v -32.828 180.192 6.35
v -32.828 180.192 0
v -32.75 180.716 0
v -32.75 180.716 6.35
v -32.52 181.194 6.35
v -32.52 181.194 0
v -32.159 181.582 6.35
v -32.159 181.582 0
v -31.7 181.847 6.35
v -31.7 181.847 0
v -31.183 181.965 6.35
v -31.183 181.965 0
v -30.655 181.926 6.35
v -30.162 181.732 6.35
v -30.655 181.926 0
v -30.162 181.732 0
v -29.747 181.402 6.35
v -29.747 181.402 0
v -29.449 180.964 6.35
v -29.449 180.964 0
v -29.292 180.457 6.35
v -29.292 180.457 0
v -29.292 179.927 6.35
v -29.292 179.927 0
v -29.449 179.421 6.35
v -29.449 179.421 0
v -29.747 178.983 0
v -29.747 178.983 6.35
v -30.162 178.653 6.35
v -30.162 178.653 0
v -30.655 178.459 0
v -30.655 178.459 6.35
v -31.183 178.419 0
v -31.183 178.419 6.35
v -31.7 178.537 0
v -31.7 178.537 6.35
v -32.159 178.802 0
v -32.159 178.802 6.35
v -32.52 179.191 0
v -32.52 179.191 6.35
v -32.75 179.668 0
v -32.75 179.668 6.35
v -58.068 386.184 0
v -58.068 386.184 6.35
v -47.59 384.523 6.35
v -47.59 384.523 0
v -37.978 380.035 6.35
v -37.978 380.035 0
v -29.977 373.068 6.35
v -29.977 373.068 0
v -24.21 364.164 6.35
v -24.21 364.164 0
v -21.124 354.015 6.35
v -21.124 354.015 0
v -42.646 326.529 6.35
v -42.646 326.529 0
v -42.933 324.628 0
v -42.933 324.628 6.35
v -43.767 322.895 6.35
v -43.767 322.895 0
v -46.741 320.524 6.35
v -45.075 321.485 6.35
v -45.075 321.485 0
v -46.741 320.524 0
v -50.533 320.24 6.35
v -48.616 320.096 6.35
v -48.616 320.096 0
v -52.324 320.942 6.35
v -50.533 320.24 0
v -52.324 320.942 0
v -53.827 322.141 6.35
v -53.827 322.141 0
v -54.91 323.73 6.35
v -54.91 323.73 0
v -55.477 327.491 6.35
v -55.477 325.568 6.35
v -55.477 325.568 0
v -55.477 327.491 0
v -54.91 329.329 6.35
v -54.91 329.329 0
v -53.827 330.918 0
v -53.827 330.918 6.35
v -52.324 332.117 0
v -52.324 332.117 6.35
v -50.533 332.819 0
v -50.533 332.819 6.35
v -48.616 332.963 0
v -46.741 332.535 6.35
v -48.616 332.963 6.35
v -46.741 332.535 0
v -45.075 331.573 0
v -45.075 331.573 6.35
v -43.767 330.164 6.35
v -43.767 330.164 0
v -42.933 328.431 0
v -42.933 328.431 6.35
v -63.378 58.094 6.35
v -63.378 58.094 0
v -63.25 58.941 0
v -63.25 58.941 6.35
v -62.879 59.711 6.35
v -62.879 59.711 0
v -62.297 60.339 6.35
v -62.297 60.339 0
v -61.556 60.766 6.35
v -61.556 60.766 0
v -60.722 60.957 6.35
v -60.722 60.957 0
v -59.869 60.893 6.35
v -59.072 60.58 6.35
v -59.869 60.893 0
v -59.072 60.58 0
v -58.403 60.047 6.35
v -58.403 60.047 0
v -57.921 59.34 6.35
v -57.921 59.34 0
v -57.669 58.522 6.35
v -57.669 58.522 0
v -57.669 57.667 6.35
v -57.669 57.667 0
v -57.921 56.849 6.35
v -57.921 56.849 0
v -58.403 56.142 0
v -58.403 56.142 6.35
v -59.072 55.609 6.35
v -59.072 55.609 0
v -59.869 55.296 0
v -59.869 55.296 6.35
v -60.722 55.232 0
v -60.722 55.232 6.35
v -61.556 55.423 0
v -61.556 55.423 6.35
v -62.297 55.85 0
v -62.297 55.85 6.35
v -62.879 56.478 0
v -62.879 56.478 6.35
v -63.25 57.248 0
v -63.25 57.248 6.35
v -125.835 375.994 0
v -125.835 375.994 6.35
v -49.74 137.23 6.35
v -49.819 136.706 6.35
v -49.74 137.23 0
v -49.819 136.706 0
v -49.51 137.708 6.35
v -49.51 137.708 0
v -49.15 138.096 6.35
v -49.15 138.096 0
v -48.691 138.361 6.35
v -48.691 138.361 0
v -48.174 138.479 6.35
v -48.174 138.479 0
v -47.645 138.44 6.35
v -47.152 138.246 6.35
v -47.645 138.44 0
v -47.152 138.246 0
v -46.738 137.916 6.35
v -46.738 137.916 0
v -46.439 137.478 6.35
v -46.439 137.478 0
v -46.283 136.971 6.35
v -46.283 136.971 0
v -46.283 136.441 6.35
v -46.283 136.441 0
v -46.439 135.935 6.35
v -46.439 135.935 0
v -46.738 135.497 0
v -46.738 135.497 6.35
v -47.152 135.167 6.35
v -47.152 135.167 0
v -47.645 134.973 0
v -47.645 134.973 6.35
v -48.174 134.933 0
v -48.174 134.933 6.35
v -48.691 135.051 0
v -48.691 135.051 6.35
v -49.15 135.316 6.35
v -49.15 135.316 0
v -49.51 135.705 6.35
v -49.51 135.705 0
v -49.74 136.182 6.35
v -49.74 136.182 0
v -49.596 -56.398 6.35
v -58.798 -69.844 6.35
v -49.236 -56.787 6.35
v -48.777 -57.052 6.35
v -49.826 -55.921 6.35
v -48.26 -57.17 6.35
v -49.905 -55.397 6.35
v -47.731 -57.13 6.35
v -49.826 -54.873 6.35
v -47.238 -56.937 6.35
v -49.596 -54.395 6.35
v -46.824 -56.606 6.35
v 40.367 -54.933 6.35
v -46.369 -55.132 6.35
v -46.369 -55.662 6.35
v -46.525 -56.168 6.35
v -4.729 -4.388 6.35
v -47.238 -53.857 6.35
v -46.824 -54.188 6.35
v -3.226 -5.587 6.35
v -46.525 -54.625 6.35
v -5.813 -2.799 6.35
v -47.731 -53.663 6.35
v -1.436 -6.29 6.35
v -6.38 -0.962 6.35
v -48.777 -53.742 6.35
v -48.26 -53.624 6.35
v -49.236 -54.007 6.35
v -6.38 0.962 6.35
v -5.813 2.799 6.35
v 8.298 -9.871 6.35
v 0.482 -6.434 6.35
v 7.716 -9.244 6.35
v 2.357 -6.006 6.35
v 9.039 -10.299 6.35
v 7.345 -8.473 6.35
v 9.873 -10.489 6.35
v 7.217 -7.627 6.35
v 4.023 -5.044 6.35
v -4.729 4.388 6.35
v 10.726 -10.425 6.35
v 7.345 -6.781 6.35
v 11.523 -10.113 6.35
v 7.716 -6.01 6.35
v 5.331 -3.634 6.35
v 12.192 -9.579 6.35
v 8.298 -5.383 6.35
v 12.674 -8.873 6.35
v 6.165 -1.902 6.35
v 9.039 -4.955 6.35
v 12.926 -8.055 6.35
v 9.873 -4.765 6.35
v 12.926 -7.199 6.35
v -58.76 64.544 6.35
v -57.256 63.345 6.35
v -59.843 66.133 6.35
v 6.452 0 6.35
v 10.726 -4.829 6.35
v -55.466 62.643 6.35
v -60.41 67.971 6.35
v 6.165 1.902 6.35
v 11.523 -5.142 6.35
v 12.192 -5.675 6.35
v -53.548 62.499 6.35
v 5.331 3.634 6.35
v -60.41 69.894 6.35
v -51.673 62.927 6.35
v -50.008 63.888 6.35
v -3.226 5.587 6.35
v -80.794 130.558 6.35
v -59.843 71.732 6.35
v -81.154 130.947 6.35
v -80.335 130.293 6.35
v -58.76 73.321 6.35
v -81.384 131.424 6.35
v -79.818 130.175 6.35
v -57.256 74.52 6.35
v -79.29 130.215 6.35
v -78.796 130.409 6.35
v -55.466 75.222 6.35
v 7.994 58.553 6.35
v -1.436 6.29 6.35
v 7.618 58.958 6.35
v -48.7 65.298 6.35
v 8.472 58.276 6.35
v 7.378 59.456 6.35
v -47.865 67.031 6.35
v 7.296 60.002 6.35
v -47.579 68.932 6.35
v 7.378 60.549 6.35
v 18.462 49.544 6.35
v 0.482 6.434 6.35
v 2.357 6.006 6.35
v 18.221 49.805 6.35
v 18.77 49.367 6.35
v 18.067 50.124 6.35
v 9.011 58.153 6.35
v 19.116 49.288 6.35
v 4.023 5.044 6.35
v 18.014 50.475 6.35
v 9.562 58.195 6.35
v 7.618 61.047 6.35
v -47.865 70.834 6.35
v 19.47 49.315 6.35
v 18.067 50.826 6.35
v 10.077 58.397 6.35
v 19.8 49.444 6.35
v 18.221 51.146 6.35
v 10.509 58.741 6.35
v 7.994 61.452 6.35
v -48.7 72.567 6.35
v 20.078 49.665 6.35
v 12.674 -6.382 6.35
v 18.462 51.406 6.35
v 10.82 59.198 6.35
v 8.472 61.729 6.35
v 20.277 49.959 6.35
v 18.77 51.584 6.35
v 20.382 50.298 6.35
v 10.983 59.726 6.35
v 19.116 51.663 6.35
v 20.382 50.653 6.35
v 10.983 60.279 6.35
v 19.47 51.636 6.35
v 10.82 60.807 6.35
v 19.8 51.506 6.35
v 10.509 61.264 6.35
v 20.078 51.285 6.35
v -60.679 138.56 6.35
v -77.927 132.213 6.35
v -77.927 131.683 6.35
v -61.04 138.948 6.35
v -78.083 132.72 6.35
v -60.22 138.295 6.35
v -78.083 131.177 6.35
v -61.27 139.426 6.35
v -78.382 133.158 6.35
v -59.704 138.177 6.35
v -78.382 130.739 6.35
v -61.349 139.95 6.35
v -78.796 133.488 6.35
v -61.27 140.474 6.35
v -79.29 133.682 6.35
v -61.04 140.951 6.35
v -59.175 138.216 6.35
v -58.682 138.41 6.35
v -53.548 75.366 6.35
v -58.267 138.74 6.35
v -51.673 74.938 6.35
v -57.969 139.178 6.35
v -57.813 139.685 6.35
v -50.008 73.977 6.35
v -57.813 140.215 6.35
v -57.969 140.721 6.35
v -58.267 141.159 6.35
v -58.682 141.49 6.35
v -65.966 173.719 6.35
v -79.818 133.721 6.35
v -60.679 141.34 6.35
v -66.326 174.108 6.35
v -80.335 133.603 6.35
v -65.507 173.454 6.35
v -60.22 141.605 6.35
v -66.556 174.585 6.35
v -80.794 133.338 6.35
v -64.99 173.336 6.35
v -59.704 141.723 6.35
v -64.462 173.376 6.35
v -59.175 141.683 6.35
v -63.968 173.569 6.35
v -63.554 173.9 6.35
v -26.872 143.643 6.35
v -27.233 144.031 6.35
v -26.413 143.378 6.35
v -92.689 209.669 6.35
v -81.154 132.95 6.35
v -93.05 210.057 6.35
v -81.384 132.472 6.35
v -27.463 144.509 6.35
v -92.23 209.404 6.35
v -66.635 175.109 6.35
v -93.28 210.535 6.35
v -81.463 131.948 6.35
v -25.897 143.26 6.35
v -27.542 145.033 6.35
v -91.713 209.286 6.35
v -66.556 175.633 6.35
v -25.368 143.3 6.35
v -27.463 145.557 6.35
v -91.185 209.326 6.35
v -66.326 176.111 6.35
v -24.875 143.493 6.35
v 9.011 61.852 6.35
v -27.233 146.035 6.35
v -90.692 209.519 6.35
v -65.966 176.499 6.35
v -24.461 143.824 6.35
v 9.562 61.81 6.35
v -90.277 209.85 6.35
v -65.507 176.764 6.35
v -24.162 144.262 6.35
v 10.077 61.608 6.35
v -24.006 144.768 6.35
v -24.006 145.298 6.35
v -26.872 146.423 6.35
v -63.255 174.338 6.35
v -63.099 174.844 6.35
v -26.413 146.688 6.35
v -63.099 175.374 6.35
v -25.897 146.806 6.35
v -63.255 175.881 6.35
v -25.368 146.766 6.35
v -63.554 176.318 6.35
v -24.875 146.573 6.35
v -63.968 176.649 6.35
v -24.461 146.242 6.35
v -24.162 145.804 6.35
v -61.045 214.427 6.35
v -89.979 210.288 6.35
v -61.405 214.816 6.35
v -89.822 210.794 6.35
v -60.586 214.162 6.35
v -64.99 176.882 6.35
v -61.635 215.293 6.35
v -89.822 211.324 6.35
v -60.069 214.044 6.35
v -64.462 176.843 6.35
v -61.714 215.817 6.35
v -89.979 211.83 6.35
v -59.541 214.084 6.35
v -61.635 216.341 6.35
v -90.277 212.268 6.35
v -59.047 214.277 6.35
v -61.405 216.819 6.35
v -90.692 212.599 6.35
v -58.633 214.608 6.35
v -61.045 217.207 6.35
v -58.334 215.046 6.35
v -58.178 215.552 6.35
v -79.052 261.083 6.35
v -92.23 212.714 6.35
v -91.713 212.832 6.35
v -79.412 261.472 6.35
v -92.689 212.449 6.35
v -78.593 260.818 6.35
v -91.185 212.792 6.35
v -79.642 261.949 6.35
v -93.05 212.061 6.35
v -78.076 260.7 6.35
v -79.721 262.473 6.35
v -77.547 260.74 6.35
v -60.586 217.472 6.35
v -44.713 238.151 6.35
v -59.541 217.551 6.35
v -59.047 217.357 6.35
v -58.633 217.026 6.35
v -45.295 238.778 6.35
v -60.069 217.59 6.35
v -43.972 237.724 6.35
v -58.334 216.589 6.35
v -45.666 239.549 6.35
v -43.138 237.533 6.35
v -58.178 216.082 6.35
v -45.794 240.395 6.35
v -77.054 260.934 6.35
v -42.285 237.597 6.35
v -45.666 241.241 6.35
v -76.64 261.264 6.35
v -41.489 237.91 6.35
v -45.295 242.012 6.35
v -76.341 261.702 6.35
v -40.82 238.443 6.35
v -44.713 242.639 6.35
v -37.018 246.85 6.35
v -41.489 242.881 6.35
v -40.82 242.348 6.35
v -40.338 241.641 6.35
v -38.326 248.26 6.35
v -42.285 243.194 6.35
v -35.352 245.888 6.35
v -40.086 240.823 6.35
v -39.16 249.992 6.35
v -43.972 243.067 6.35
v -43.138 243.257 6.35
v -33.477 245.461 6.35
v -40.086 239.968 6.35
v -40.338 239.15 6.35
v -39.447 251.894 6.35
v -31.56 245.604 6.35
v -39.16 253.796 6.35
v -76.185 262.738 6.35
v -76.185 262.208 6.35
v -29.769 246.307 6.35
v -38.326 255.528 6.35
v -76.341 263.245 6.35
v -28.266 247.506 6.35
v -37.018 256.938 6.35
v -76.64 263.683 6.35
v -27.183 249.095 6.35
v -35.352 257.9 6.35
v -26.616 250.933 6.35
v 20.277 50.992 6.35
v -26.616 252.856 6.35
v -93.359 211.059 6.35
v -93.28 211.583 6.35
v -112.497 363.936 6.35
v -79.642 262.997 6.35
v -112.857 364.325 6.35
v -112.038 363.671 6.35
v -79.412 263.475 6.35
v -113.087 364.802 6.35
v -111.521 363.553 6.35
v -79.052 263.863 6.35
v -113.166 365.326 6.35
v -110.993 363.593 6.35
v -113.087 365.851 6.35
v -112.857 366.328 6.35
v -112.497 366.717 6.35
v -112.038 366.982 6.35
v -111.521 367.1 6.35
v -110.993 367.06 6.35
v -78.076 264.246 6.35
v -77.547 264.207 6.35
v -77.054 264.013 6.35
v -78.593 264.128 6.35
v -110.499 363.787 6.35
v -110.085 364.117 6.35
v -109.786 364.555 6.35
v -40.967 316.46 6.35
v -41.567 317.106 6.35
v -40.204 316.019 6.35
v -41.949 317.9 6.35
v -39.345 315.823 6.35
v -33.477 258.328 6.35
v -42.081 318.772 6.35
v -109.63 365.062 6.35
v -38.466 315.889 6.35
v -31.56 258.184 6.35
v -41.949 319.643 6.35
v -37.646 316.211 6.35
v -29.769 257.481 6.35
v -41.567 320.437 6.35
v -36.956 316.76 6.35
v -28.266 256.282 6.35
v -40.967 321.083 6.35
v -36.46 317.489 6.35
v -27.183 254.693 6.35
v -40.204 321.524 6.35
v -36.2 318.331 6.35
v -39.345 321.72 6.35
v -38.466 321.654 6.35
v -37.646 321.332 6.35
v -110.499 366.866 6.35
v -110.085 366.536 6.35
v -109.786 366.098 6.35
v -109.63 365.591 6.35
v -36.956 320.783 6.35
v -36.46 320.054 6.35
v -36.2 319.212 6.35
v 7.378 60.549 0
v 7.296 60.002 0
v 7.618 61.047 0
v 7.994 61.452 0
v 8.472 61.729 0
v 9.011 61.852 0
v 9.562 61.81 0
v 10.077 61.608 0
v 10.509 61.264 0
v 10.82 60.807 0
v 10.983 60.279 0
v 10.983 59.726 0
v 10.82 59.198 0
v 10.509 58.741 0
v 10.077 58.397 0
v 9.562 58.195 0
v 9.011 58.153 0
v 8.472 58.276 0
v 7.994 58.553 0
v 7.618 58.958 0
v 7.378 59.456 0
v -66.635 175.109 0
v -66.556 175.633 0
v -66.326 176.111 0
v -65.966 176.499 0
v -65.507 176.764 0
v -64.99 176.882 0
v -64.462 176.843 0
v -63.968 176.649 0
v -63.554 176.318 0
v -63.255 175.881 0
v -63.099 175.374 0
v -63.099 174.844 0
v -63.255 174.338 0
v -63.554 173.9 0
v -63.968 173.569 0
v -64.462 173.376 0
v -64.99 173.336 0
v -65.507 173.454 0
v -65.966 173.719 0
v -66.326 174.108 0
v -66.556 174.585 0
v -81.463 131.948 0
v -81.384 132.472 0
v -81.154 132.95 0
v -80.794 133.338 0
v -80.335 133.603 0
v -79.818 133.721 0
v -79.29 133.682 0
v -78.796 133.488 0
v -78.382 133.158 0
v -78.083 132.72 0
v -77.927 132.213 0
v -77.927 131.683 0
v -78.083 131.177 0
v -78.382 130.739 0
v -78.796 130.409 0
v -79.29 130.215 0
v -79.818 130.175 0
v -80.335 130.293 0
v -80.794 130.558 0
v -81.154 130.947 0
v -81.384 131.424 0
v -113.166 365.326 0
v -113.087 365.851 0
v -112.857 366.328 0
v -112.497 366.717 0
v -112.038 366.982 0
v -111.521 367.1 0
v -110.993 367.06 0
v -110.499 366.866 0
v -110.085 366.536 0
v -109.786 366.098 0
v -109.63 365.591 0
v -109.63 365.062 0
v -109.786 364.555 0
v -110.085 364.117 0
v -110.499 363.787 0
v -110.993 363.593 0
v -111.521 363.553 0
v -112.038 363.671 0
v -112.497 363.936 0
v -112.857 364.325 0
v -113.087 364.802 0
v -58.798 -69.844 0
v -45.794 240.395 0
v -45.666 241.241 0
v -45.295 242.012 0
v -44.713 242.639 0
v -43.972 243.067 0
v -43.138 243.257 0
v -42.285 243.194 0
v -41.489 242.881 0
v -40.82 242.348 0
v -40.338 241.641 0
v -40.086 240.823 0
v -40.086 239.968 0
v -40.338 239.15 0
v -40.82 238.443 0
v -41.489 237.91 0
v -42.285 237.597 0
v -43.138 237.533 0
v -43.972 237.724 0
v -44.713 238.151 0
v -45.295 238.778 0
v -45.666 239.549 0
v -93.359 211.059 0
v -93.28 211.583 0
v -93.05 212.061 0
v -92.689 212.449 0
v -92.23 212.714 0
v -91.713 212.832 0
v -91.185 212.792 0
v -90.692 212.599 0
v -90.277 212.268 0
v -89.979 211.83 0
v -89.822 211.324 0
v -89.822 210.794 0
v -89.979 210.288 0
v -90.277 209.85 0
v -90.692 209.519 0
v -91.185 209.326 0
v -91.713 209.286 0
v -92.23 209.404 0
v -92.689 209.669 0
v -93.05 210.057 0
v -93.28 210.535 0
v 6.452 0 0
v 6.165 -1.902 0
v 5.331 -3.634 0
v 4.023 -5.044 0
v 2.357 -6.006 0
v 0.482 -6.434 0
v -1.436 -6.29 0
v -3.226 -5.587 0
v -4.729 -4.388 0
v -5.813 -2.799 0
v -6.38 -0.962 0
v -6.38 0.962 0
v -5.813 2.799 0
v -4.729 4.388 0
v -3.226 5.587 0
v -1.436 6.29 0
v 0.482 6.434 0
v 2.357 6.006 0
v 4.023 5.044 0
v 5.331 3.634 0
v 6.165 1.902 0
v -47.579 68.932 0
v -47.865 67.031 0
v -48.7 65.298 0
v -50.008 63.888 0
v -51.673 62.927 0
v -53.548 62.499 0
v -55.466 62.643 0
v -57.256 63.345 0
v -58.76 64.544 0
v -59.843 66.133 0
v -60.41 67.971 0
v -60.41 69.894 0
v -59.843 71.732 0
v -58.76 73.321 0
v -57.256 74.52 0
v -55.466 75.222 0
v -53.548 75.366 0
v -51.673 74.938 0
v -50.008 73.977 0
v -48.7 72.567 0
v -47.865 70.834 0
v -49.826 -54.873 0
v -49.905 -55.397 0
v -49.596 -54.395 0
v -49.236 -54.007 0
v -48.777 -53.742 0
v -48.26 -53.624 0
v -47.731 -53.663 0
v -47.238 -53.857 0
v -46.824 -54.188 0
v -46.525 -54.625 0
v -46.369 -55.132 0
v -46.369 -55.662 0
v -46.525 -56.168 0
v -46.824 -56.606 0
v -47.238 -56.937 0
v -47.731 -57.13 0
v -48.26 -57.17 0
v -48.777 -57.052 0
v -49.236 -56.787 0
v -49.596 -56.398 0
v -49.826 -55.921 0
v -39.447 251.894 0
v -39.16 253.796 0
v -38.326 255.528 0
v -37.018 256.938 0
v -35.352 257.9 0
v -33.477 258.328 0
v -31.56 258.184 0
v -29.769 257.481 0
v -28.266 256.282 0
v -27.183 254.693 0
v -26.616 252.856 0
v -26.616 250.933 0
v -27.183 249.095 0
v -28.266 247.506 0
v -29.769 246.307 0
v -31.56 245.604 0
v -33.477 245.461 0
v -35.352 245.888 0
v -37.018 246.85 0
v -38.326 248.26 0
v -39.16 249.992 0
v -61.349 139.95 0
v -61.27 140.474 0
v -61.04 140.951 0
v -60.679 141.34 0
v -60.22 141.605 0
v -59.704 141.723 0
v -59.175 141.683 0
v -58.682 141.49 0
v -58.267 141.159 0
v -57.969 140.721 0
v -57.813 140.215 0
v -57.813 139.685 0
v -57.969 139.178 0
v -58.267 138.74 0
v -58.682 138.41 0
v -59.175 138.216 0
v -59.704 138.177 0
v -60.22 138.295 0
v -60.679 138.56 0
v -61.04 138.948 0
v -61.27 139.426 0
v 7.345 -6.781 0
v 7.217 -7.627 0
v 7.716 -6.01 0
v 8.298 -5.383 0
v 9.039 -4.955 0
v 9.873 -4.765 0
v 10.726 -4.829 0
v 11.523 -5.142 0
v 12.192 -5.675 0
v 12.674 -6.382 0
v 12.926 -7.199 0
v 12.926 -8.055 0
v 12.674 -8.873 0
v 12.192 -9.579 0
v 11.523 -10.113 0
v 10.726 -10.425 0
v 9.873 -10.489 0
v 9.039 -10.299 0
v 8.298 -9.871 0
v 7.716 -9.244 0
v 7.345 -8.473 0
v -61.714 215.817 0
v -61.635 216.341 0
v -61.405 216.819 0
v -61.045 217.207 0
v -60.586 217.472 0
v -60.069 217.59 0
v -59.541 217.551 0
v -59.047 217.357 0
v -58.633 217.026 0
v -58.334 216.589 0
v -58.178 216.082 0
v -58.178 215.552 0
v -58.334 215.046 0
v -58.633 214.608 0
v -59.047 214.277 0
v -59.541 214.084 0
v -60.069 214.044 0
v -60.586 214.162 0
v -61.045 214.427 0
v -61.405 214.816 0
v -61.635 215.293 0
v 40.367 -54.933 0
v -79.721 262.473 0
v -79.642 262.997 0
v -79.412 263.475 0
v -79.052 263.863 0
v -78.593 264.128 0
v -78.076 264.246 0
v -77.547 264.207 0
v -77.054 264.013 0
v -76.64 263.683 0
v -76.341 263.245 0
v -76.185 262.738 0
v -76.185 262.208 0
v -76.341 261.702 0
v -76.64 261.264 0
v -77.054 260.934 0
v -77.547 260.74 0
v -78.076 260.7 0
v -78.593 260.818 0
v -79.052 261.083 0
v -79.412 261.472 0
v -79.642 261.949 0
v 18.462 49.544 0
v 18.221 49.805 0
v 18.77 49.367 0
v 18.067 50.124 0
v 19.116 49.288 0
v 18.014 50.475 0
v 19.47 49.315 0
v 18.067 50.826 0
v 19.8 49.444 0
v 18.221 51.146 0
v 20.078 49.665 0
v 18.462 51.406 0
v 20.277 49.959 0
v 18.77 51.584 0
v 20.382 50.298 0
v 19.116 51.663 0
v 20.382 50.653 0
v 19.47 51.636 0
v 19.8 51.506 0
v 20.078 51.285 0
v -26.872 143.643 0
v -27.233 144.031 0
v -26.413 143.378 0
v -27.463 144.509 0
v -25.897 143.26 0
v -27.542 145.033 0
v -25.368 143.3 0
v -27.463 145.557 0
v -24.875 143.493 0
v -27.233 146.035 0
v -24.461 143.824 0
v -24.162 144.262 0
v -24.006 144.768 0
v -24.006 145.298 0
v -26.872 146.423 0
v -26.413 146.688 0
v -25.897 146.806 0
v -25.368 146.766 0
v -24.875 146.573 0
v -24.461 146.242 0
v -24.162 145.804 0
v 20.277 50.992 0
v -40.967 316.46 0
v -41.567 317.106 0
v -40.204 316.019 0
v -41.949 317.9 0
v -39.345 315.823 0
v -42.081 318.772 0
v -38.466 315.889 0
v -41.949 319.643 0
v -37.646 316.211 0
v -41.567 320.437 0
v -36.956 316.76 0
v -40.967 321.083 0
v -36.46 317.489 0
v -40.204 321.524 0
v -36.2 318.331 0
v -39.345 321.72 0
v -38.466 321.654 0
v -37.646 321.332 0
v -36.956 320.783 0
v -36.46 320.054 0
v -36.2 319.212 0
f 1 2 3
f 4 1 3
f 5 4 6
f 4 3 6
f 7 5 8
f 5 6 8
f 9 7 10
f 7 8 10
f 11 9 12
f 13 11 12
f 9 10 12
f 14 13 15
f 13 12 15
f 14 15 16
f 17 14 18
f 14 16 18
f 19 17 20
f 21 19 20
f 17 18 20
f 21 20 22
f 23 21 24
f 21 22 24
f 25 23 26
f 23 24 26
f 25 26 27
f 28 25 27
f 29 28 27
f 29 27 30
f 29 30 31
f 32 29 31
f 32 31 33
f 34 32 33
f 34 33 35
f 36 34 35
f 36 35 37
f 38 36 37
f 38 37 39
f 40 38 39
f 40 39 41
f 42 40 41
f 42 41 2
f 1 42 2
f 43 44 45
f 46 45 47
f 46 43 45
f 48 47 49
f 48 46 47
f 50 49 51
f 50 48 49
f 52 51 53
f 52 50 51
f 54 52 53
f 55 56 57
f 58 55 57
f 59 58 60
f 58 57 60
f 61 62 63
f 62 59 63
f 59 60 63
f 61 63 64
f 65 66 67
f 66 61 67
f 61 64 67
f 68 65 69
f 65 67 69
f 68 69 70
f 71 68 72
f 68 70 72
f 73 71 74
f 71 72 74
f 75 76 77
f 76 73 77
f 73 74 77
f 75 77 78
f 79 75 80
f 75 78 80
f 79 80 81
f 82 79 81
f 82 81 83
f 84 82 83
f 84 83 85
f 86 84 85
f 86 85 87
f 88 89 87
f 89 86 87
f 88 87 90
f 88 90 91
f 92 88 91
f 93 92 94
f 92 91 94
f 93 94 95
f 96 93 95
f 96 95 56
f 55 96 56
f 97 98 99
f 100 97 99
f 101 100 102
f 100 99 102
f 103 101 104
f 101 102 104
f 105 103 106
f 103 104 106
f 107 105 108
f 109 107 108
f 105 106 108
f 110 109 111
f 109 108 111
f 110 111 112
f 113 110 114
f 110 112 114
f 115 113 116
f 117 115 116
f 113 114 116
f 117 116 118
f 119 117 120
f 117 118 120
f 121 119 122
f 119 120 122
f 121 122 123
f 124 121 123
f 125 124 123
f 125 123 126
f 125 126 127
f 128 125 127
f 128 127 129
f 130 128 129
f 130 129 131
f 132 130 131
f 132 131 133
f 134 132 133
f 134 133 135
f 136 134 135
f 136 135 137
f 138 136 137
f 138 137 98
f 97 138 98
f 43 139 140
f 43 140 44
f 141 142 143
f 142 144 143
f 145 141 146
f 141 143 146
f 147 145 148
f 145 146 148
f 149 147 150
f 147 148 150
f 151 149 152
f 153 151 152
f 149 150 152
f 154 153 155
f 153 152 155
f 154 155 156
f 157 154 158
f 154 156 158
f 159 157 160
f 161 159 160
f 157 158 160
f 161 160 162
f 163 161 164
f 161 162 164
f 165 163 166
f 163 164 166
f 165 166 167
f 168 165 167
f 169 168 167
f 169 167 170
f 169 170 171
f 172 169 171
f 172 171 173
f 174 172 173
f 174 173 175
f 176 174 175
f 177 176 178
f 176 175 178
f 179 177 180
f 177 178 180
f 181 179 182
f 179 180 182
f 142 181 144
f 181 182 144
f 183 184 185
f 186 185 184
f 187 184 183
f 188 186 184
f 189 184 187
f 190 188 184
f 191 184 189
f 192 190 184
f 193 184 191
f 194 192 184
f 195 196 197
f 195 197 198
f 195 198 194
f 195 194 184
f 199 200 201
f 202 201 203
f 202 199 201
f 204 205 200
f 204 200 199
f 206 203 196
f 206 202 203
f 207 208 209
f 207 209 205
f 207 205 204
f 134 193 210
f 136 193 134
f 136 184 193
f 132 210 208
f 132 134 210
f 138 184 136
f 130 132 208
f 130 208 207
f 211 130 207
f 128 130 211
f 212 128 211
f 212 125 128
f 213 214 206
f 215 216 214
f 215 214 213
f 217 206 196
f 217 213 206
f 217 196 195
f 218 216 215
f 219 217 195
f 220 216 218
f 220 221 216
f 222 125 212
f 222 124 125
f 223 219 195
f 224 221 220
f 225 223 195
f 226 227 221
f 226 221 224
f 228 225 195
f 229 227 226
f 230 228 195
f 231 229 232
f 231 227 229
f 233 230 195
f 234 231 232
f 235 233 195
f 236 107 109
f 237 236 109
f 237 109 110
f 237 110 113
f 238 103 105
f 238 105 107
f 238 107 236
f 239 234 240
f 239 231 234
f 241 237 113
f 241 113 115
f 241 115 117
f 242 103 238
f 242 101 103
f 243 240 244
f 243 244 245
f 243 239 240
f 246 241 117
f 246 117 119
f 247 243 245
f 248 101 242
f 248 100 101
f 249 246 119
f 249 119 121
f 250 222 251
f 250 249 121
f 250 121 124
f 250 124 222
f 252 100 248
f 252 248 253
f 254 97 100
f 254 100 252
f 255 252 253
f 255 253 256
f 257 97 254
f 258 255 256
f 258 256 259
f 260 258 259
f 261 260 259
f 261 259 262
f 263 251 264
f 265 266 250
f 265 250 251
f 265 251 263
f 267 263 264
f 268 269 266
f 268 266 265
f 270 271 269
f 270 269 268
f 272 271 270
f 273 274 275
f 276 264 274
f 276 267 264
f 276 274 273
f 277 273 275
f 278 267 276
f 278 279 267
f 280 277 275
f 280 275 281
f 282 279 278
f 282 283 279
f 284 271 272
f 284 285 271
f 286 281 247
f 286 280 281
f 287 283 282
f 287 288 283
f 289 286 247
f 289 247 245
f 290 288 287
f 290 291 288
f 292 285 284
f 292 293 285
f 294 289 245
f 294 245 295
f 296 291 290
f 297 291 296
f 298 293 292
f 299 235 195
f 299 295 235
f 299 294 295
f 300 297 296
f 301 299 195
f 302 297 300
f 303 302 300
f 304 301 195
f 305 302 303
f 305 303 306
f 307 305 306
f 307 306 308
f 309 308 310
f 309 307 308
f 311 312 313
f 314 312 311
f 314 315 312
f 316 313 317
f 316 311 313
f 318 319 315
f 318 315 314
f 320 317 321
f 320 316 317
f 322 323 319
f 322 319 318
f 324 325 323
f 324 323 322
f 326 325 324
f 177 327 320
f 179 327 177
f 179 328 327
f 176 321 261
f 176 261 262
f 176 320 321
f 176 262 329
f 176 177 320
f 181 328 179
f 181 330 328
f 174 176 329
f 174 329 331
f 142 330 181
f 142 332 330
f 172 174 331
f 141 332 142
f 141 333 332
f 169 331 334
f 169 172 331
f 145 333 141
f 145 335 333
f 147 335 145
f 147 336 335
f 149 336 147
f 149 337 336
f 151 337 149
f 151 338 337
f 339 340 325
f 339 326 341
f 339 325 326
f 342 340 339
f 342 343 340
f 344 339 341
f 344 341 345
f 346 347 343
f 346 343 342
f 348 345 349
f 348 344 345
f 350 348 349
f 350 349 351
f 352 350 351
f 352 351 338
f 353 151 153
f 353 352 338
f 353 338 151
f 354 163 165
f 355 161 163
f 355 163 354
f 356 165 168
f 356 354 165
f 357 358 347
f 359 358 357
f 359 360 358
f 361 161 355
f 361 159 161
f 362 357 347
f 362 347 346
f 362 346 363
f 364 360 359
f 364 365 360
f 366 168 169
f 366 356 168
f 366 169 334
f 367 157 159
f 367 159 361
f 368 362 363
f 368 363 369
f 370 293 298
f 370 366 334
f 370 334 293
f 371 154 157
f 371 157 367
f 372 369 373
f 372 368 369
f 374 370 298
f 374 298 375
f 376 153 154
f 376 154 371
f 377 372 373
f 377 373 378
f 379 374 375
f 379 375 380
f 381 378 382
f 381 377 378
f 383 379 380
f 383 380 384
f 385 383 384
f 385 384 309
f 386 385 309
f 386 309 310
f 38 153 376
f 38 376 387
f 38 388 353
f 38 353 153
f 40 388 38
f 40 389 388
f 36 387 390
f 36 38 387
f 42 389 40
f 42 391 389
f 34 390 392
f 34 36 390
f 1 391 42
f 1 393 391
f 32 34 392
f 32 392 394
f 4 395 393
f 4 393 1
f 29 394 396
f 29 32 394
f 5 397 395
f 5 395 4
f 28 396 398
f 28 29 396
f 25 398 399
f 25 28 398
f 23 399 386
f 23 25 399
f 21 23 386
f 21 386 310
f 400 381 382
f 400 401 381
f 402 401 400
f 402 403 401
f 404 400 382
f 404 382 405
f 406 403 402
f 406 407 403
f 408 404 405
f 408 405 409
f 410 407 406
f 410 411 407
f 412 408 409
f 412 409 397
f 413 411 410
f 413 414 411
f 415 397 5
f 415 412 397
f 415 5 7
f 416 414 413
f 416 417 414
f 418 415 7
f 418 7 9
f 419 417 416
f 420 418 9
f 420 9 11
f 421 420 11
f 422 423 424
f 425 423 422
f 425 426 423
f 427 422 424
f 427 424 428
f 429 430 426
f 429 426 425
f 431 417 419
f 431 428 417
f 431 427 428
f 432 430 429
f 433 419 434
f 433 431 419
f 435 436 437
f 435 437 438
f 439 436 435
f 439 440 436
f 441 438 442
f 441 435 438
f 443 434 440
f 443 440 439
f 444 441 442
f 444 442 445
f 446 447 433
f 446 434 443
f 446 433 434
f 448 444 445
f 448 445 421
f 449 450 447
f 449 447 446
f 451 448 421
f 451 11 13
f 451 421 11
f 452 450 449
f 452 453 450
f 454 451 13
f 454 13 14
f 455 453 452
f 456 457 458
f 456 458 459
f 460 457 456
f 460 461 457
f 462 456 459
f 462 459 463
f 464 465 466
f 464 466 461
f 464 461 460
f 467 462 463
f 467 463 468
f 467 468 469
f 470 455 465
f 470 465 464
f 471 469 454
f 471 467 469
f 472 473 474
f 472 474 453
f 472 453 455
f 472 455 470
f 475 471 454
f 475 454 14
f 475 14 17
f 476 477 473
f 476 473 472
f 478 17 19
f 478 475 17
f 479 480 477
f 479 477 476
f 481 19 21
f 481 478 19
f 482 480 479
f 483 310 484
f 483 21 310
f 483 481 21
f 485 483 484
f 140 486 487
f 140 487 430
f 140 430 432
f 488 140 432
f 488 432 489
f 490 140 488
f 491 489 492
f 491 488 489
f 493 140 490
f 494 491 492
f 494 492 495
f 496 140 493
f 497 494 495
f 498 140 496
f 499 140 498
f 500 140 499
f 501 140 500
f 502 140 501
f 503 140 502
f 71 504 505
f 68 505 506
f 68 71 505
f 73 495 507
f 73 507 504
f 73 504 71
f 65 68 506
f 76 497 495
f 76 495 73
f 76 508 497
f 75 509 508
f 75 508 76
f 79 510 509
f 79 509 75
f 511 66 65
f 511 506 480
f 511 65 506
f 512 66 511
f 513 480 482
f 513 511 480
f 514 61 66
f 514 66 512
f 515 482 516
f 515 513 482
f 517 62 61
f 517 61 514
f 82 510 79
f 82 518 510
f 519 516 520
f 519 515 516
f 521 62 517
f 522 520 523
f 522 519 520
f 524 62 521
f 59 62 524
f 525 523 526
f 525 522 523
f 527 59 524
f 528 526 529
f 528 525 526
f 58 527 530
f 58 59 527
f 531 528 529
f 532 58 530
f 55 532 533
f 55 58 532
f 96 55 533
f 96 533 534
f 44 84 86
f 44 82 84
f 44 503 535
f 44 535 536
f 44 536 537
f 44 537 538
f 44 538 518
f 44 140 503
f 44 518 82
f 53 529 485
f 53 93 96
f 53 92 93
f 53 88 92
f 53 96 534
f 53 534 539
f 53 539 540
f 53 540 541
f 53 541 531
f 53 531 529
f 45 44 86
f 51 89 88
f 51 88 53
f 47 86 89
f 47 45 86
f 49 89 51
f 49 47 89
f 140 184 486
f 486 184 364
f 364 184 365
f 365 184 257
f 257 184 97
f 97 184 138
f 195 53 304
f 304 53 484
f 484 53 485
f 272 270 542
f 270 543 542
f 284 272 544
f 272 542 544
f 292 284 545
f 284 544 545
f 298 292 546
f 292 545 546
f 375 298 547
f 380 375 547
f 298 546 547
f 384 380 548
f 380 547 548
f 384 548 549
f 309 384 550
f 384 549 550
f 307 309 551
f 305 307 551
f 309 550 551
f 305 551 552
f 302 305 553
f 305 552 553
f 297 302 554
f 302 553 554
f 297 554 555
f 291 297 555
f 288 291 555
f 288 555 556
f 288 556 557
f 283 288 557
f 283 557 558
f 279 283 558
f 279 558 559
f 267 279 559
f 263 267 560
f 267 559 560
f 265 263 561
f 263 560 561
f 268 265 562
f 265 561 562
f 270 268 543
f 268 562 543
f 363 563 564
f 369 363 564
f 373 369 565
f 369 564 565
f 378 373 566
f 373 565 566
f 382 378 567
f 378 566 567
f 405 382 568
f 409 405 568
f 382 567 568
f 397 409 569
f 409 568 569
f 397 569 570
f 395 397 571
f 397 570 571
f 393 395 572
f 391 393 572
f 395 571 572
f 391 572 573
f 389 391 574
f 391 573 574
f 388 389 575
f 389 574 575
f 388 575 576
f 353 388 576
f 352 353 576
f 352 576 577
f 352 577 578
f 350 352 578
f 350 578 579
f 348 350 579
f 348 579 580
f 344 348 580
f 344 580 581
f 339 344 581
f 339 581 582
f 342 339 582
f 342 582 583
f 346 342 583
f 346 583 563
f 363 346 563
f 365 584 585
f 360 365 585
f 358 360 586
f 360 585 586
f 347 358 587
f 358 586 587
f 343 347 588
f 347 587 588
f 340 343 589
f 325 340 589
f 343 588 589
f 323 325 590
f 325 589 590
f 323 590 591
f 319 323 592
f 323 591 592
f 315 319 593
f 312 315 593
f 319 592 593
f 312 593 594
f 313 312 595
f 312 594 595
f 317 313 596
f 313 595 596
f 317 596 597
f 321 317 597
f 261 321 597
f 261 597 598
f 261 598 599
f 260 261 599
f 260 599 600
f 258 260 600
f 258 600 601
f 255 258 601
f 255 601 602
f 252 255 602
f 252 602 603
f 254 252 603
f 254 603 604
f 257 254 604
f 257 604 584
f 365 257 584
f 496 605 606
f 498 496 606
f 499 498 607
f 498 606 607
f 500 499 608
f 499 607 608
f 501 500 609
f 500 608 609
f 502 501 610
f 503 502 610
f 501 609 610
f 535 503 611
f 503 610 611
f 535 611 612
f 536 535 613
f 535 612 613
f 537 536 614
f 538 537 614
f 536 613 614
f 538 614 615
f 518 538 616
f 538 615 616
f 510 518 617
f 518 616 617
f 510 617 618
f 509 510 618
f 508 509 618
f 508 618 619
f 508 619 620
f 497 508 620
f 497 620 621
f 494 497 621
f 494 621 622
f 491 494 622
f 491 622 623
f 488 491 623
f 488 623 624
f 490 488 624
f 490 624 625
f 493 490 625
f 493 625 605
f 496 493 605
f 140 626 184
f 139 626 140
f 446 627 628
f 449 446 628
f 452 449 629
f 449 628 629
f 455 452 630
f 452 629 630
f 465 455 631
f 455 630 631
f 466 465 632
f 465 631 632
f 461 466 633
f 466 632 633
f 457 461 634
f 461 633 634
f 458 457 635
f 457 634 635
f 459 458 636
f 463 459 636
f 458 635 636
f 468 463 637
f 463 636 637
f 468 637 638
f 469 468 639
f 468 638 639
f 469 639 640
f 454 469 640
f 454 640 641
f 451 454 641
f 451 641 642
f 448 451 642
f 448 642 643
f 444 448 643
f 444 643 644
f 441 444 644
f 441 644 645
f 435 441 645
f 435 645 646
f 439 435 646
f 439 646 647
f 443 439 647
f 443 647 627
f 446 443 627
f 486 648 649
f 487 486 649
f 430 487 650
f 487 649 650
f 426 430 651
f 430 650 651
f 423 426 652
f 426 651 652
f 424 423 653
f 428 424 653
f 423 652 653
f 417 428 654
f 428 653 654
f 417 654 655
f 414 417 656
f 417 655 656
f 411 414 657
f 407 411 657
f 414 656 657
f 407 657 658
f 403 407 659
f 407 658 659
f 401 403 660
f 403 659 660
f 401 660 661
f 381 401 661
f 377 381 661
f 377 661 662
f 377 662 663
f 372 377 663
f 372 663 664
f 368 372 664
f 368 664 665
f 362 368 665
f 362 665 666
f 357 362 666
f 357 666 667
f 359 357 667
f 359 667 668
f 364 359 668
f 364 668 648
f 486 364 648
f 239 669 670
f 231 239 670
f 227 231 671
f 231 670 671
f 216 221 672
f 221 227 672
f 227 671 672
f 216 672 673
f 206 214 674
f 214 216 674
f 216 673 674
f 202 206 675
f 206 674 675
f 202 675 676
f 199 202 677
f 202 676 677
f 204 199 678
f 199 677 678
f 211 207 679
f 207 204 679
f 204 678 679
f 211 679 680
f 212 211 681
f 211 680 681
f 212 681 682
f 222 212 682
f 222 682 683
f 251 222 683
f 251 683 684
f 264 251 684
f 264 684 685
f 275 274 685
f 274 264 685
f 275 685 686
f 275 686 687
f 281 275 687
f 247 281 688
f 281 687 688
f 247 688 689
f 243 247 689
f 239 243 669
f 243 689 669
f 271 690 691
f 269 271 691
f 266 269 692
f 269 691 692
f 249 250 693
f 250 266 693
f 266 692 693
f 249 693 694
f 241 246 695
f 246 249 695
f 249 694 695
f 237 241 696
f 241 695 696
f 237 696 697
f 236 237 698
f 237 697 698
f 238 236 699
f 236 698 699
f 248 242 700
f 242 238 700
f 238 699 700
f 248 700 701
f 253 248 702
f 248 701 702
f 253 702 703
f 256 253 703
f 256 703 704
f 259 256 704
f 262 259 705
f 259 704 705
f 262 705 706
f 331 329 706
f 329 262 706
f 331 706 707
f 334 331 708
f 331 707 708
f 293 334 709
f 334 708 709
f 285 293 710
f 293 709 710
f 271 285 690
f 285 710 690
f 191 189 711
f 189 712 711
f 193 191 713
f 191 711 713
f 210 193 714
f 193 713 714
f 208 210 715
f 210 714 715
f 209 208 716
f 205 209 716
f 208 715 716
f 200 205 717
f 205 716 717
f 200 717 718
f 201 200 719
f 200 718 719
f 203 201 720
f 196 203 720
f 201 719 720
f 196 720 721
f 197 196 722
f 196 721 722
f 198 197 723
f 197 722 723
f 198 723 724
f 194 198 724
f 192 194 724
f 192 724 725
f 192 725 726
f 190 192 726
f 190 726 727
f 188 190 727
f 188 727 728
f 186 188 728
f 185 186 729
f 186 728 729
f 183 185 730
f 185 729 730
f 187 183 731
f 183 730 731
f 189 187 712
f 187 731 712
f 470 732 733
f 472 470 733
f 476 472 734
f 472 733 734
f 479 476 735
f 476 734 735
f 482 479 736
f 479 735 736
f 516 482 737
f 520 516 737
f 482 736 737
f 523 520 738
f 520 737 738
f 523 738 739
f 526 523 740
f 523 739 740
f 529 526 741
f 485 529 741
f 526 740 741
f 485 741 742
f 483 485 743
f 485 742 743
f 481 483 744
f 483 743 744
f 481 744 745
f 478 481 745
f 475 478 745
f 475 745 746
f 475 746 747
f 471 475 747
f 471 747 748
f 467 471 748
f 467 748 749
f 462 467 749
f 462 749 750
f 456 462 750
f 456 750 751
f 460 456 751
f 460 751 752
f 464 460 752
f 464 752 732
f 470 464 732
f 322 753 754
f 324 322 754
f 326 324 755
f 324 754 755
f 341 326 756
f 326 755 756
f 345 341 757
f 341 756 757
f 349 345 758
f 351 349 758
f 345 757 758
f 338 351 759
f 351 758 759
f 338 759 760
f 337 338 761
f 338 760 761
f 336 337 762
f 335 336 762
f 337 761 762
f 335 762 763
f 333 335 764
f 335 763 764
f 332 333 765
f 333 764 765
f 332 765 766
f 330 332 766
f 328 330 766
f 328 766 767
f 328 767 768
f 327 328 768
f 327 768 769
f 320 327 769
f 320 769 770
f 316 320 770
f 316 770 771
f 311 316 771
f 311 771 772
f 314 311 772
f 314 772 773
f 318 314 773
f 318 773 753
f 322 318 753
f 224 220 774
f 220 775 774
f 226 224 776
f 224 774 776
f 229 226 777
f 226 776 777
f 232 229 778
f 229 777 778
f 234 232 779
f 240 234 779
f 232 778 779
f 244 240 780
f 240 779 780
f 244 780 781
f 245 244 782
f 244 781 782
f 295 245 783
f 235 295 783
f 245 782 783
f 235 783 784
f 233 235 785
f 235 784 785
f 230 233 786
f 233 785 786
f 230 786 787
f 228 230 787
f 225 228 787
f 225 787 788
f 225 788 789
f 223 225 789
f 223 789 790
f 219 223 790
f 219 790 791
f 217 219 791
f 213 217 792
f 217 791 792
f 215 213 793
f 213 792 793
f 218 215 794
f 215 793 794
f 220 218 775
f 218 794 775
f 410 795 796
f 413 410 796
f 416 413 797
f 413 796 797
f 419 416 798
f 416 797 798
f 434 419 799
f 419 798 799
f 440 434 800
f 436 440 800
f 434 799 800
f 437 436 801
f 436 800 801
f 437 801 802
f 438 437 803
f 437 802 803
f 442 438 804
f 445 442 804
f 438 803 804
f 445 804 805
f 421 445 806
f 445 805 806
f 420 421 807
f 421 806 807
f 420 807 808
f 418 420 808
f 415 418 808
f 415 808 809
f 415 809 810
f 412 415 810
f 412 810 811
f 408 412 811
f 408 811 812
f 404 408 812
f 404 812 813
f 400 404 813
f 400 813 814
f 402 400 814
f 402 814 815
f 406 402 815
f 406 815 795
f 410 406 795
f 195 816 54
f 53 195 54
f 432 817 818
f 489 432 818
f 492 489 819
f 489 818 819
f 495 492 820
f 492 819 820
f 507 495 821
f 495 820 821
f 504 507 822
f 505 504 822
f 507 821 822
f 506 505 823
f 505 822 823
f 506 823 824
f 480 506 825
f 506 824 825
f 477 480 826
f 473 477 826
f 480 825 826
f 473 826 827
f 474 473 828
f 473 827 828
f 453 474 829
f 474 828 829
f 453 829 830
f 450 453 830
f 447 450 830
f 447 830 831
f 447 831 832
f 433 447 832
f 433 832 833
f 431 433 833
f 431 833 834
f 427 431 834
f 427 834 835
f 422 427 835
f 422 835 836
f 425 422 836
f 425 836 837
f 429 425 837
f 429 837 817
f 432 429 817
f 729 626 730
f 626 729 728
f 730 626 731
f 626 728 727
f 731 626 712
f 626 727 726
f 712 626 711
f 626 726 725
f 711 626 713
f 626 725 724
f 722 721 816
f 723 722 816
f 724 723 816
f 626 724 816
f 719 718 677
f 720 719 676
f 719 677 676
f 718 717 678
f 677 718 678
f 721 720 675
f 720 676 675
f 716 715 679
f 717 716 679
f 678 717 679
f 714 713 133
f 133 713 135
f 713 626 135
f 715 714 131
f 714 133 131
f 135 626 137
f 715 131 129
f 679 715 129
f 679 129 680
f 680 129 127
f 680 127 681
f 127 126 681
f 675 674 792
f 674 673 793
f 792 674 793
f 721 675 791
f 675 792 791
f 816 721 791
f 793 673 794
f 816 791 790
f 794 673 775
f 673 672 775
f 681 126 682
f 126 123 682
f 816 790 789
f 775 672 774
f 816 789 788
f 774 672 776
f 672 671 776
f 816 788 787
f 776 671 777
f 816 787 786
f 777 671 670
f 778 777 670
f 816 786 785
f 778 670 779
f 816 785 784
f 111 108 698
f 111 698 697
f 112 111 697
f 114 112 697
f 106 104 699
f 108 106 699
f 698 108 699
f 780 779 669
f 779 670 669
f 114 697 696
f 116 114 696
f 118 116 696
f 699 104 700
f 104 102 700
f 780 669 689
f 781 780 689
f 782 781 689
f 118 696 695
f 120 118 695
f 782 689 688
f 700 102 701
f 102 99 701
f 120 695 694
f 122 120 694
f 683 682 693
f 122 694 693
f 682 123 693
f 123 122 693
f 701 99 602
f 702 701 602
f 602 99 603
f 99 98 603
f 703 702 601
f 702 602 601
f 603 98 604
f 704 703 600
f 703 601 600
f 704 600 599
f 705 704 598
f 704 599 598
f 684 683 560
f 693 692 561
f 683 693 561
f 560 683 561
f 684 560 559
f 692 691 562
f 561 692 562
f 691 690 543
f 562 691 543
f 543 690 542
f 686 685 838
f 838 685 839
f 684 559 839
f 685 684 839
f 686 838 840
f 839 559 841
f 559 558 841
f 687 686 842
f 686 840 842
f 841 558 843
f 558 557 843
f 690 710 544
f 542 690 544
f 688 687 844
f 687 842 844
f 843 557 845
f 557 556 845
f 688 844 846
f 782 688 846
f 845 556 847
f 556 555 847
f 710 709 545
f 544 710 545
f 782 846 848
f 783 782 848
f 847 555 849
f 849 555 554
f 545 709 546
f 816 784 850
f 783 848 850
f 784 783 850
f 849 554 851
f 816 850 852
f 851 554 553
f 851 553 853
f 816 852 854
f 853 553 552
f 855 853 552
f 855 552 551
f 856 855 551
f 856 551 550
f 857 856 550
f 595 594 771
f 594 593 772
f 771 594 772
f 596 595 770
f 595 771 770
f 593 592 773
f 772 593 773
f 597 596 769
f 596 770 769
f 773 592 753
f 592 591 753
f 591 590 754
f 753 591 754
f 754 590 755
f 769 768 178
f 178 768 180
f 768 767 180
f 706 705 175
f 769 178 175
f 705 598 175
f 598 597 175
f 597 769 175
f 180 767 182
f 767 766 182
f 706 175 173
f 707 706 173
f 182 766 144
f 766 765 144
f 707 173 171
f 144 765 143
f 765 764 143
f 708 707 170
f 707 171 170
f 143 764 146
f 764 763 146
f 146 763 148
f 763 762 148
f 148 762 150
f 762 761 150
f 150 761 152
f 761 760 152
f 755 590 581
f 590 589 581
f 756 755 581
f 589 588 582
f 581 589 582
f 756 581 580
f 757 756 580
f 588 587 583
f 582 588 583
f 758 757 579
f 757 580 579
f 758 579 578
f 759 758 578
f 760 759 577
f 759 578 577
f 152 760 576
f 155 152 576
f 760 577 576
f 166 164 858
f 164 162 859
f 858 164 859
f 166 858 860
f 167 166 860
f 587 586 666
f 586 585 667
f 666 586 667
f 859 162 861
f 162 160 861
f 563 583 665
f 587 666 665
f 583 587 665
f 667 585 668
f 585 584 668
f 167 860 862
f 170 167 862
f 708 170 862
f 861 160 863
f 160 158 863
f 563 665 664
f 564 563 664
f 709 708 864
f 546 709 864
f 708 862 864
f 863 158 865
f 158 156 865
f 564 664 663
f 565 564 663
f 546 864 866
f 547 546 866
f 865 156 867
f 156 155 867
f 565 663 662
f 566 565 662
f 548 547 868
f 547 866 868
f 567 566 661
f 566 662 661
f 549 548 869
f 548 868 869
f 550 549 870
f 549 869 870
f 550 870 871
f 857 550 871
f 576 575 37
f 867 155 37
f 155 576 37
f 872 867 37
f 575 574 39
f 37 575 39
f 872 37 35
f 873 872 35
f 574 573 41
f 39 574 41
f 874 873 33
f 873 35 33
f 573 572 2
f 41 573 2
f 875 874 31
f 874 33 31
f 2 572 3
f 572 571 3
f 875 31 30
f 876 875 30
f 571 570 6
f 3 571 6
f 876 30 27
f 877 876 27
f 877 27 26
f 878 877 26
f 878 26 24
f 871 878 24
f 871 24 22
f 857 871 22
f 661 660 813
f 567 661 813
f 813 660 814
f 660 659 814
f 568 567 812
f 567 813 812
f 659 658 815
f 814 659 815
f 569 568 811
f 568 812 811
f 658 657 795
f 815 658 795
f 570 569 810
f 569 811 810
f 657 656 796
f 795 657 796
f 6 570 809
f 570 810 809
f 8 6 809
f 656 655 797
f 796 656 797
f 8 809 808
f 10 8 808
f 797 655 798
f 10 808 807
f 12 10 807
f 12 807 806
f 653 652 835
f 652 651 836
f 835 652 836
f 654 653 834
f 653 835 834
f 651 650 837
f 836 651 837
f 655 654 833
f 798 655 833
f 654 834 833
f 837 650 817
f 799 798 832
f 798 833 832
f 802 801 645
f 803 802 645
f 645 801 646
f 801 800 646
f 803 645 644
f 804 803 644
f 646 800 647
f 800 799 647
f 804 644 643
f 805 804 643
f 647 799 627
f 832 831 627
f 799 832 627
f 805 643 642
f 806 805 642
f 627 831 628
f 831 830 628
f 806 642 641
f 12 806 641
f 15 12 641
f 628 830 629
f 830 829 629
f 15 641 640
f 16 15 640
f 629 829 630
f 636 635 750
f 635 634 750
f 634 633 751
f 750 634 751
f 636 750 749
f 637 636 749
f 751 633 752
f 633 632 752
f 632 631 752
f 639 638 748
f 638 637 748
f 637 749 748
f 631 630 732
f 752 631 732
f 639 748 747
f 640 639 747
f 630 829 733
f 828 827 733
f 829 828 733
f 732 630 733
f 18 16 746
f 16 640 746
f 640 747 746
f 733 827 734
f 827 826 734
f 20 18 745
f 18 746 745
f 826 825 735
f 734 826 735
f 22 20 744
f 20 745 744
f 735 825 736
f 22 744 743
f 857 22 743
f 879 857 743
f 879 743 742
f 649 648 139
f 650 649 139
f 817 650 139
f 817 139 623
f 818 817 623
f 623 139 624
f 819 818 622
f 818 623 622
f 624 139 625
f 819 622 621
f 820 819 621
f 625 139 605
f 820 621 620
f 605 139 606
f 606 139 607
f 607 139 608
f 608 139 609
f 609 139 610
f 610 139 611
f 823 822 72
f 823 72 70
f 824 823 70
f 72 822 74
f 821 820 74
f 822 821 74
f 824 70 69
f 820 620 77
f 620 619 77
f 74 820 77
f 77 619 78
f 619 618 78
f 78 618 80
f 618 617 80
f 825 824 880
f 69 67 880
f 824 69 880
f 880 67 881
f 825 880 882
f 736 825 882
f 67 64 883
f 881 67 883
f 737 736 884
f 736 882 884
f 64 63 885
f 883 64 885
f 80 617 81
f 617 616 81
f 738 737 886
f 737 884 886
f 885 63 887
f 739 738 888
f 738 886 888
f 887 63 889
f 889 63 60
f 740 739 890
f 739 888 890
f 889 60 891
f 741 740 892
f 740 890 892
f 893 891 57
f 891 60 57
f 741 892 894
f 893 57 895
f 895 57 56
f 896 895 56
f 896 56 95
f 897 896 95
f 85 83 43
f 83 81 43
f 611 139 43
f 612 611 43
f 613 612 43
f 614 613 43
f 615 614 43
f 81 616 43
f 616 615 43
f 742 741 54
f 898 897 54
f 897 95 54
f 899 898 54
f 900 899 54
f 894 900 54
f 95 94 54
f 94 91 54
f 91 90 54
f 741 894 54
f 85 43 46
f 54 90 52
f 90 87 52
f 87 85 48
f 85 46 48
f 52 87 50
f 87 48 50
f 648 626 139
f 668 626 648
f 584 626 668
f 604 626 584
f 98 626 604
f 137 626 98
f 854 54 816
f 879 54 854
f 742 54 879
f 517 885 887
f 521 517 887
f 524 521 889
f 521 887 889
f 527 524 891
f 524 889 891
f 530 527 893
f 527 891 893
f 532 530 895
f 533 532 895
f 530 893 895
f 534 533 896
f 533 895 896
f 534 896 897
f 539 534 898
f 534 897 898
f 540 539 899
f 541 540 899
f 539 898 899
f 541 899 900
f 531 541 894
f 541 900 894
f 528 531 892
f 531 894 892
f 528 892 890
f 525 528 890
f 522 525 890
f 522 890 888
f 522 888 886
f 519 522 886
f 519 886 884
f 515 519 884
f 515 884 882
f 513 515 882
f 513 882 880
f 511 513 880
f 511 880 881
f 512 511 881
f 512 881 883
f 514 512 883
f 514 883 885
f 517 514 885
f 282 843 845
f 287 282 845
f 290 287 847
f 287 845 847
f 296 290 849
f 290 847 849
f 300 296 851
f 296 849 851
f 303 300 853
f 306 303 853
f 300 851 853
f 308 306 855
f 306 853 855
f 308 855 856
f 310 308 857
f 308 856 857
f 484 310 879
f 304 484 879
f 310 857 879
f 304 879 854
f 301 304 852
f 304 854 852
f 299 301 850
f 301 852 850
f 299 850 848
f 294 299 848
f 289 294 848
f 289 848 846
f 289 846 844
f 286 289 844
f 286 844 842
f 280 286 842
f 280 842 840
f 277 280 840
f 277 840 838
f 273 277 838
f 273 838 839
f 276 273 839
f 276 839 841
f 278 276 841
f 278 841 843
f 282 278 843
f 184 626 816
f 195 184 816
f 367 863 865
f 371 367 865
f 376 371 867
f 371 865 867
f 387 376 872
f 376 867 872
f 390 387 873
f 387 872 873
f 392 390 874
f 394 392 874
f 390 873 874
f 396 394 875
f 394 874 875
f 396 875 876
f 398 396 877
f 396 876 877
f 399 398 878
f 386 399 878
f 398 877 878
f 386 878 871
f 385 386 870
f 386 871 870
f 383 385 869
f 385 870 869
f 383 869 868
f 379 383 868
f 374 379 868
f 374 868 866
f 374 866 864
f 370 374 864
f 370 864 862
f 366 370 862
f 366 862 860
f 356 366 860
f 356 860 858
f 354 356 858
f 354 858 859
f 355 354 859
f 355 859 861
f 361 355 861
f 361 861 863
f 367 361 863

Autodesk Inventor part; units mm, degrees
ref_plane "YZ Plane" through (0, 0, 0) normal (1, 0, 0) x (0, 1, 0)
ref_plane "XZ Plane" through (0, 0, 0) normal (0, 1, 0) x (-1, 0, 0)
ref_plane "Work Plane1" through (-0.0003, 0.0023, 0) normal (0, 0, 1) x (1, 0, 0)
sketch "Sketch1" plane through (-0.0003, 0.0023, 0) normal (0, 0, 1) x (1, 0, 0)
  circle A0 centre (0.0003, -0.0023) radius 6.3373 construction
  circle A1 centre (-49.0975, 326.5271) radius 6.3373 construction
  circle A2 centre (0.0003, -0.0023) radius 6.4516
  circle A3 centre (-49.0975, 326.5271) radius 6.4516
  circle A4 centre (-49.0975, 326.5271) radius 60.325 construction
  circle A5 centre (0.0003, -0.0023) radius 60.325 construction
  circle A6 centre (0.0003, -0.0023) radius 31.75 construction
  line L0 (40.3672, -54.9357) -> (-26.6702, 390.9025)
  circle A7 centre (-49.0975, 326.5271) radius 31.75 construction
  line L1 (-58.7973, -69.8464) -> (40.3672, -54.9357)
  line L2 (-125.8347, 375.9918) -> (-26.6702, 390.9025)
  circle A8 centre (-54.0299, 68.9302) radius 6.3373 construction
  circle A9 centre (-36.6118, 251.3479) radius 6.3373 construction
  circle A10 centre (-54.0299, 68.9302) radius 6.4516
  line L3 (-82.6344, 131.3852) -> (-87.6899, 165.0073) construction
  line L4 (-58.7973, -69.8464) -> (-125.8347, 375.9918)
  point P0 (0.0003, -0.0023)
  dimension "d0" = 12.9032
  dimension "d3" = 12.9032
  dimension "d11" = 120.65
  dimension "d13" = 120.65
  dimension "d14" = 63.5
  dimension "d16" = 63.5
  dimension "d19" = 12.9032
extrude "Extrusion1" add sketch "Sketch1" along normal blind 6.35
sketch "Sketch2" plane through (-0.0003, 0.0023, 0) normal (0, 0, -1) x (-1, 0, 0)
  circle A0 centre (111.3879, 365.3242) radius 1.778 construction
  circle A1 centre (77.9428, 262.471) radius 1.778 construction
  circle A2 centre (31.0502, 180.1901) radius 1.778 construction
  circle A3 centre (64.857, 175.1068) radius 1.778 construction
  circle A4 centre (25.7636, 145.0307) radius 1.778 construction
  circle A5 centre (59.5704, 139.9475) radius 1.778 construction
  circle A6 centre (48.1268, -55.3992) radius 1.778 construction
  circle A7 centre (111.3879, 365.3242) radius 1.778
  circle A8 centre (77.9428, 262.471) radius 1.778
  circle A9 centre (64.857, 175.1068) radius 1.778
  circle A10 centre (59.5704, 139.9475) radius 1.778
  circle A11 centre (31.0502, 180.1901) radius 1.778
  circle A12 centre (25.7636, 145.0307) radius 1.778
  circle A13 centre (48.1268, -55.3992) radius 1.778
  point P0 (-0.0003, -0.0023)
extrude "Extrusion2" cut sketch "Sketch2" against normal through all
sketch "Sketch3" plane through (-0.0003, 0.0023, 0) normal (0, 0, -1) x (-1, 0, 0)
  circle A0 centre (-7.8664, -5.812) radius 2.8702 construction
  circle A1 centre (58.7683, 60.3758) radius 2.8702 construction
  circle A2 centre (41.3502, 242.7936) radius 2.8702 projected
  circle A3 centre (41.2314, 320.7173) radius 2.8702 construction
  circle A4 centre (39.1236, 318.7692) radius 2.9567
  circle A5 centre (42.9235, 240.393) radius 2.8702
  circle A6 centre (60.507, 58.0922) radius 2.8702
  circle A7 centre (-10.0879, -7.6295) radius 2.8702
  point P0 (-0.0003, -0.0023)
extrude "Extrusion3" cut sketch "Sketch3" against normal through all contours A2 A5 | A2 A5 | A4 | A6 | A7 picked at (41.9477, 242.03) picked at (43.9052, 238.7756)
sketch "Sketch4" plane through (-0.0003, 0.0023, 0) normal (0, 0, -1) x (-1, 0, 0)
  arc A0 (58.0673, 386.1815) -> (21.1234, 354.0125) centre (58.7307, 348.1214) ccw construction
  arc A1 (58.0673, 386.1815) -> (21.1234, 354.0125) centre (58.7307, 348.1214) ccw
  line L0 (26.6702, 390.9025) -> (125.8347, 375.9918) projected
  line L1 (58.0673, 386.1815) -> (26.6702, 390.9025)
  line L2 (26.6702, 390.9025) -> (21.1234, 354.0125)
  point P0 (-0.0003, -0.0023)
extrude "Extrusion4" cut sketch "Sketch4" against normal through all
sketch "Sketch5" plane through (-0.0003, 0.0023, 0) normal (0, 0, -1) x (-1, 0, 0)
  circle A0 centre (-9.1502, 60.0002) radius 2.25 construction
  circle A1 centre (-9.1502, 60.0002) radius 1.8542
  point P0 (-0.0003, -0.0023)
  dimension "d30" = 3.7084
extrude "Extrusion5" cut sketch "Sketch5" against normal through all
sketch "Sketch6" plane through (-0.0003, 0.0023, 0) normal (0, 0, -1) x (-1, 0, 0)
  line L0 (-6.9196, 56.5789) -> (-27.6054, 48.4519) construction
  line L1 (-23.0039, 33.2159) -> (-17.622, 69.0087) construction
  line L2 (-40.3672, -54.9357) -> (21.1234, 354.0125) construction
  circle A0 centre (-19.2051, 50.473) radius 1.1906
  point P0 (-0.0003, -0.0023)
  dimension "d33" = 2.3813
extrude "Extrusion6" cut sketch "Sketch6" against normal through all
sketch "Sketch7" plane through (-0.0003, 0.0023, 0) normal (0, 0, -1) x (-1, 0, 0)
  circle A0 centre (32.9949, 251.8918) radius 6.3373 construction
  circle A1 centre (32.9949, 251.8918) radius 6.4516
  point P0 (-0.0003, -0.0023)
  dimension "d36" = 12.9032
extrude "Extrusion7" cut sketch "Sketch7" against normal through all
sketch "Sketch8" plane through (-0.0003, 0.0023, 0) normal (0, 0, -1) x (-1, 0, 0)
  circle A0 centre (91.5803, 211.0567) radius 3.81 construction
  circle A1 centre (79.685, 131.946) radius 3.81 construction
  circle A2 centre (48.0407, 136.7041) radius 3.81 construction
  circle A3 centre (59.936, 215.8148) radius 3.81 construction
  circle A4 centre (91.5803, 211.0567) radius 1.778
  circle A5 centre (79.685, 131.946) radius 1.778
  circle A6 centre (59.936, 215.8148) radius 1.778
  circle A7 centre (48.0407, 136.7041) radius 1.778
  point P0 (-0.0003, -0.0023)
  dimension "d39" = 3.556
  dimension "d40" = 3.556
  dimension "d41" = 3.556
  dimension "d42" = 3.556
extrude "Extrusion8" cut sketch "Sketch8" against normal through all
equation "\"d0\" = d3"
equation "\"d19\" = d3"
properties part number "inside wall"
